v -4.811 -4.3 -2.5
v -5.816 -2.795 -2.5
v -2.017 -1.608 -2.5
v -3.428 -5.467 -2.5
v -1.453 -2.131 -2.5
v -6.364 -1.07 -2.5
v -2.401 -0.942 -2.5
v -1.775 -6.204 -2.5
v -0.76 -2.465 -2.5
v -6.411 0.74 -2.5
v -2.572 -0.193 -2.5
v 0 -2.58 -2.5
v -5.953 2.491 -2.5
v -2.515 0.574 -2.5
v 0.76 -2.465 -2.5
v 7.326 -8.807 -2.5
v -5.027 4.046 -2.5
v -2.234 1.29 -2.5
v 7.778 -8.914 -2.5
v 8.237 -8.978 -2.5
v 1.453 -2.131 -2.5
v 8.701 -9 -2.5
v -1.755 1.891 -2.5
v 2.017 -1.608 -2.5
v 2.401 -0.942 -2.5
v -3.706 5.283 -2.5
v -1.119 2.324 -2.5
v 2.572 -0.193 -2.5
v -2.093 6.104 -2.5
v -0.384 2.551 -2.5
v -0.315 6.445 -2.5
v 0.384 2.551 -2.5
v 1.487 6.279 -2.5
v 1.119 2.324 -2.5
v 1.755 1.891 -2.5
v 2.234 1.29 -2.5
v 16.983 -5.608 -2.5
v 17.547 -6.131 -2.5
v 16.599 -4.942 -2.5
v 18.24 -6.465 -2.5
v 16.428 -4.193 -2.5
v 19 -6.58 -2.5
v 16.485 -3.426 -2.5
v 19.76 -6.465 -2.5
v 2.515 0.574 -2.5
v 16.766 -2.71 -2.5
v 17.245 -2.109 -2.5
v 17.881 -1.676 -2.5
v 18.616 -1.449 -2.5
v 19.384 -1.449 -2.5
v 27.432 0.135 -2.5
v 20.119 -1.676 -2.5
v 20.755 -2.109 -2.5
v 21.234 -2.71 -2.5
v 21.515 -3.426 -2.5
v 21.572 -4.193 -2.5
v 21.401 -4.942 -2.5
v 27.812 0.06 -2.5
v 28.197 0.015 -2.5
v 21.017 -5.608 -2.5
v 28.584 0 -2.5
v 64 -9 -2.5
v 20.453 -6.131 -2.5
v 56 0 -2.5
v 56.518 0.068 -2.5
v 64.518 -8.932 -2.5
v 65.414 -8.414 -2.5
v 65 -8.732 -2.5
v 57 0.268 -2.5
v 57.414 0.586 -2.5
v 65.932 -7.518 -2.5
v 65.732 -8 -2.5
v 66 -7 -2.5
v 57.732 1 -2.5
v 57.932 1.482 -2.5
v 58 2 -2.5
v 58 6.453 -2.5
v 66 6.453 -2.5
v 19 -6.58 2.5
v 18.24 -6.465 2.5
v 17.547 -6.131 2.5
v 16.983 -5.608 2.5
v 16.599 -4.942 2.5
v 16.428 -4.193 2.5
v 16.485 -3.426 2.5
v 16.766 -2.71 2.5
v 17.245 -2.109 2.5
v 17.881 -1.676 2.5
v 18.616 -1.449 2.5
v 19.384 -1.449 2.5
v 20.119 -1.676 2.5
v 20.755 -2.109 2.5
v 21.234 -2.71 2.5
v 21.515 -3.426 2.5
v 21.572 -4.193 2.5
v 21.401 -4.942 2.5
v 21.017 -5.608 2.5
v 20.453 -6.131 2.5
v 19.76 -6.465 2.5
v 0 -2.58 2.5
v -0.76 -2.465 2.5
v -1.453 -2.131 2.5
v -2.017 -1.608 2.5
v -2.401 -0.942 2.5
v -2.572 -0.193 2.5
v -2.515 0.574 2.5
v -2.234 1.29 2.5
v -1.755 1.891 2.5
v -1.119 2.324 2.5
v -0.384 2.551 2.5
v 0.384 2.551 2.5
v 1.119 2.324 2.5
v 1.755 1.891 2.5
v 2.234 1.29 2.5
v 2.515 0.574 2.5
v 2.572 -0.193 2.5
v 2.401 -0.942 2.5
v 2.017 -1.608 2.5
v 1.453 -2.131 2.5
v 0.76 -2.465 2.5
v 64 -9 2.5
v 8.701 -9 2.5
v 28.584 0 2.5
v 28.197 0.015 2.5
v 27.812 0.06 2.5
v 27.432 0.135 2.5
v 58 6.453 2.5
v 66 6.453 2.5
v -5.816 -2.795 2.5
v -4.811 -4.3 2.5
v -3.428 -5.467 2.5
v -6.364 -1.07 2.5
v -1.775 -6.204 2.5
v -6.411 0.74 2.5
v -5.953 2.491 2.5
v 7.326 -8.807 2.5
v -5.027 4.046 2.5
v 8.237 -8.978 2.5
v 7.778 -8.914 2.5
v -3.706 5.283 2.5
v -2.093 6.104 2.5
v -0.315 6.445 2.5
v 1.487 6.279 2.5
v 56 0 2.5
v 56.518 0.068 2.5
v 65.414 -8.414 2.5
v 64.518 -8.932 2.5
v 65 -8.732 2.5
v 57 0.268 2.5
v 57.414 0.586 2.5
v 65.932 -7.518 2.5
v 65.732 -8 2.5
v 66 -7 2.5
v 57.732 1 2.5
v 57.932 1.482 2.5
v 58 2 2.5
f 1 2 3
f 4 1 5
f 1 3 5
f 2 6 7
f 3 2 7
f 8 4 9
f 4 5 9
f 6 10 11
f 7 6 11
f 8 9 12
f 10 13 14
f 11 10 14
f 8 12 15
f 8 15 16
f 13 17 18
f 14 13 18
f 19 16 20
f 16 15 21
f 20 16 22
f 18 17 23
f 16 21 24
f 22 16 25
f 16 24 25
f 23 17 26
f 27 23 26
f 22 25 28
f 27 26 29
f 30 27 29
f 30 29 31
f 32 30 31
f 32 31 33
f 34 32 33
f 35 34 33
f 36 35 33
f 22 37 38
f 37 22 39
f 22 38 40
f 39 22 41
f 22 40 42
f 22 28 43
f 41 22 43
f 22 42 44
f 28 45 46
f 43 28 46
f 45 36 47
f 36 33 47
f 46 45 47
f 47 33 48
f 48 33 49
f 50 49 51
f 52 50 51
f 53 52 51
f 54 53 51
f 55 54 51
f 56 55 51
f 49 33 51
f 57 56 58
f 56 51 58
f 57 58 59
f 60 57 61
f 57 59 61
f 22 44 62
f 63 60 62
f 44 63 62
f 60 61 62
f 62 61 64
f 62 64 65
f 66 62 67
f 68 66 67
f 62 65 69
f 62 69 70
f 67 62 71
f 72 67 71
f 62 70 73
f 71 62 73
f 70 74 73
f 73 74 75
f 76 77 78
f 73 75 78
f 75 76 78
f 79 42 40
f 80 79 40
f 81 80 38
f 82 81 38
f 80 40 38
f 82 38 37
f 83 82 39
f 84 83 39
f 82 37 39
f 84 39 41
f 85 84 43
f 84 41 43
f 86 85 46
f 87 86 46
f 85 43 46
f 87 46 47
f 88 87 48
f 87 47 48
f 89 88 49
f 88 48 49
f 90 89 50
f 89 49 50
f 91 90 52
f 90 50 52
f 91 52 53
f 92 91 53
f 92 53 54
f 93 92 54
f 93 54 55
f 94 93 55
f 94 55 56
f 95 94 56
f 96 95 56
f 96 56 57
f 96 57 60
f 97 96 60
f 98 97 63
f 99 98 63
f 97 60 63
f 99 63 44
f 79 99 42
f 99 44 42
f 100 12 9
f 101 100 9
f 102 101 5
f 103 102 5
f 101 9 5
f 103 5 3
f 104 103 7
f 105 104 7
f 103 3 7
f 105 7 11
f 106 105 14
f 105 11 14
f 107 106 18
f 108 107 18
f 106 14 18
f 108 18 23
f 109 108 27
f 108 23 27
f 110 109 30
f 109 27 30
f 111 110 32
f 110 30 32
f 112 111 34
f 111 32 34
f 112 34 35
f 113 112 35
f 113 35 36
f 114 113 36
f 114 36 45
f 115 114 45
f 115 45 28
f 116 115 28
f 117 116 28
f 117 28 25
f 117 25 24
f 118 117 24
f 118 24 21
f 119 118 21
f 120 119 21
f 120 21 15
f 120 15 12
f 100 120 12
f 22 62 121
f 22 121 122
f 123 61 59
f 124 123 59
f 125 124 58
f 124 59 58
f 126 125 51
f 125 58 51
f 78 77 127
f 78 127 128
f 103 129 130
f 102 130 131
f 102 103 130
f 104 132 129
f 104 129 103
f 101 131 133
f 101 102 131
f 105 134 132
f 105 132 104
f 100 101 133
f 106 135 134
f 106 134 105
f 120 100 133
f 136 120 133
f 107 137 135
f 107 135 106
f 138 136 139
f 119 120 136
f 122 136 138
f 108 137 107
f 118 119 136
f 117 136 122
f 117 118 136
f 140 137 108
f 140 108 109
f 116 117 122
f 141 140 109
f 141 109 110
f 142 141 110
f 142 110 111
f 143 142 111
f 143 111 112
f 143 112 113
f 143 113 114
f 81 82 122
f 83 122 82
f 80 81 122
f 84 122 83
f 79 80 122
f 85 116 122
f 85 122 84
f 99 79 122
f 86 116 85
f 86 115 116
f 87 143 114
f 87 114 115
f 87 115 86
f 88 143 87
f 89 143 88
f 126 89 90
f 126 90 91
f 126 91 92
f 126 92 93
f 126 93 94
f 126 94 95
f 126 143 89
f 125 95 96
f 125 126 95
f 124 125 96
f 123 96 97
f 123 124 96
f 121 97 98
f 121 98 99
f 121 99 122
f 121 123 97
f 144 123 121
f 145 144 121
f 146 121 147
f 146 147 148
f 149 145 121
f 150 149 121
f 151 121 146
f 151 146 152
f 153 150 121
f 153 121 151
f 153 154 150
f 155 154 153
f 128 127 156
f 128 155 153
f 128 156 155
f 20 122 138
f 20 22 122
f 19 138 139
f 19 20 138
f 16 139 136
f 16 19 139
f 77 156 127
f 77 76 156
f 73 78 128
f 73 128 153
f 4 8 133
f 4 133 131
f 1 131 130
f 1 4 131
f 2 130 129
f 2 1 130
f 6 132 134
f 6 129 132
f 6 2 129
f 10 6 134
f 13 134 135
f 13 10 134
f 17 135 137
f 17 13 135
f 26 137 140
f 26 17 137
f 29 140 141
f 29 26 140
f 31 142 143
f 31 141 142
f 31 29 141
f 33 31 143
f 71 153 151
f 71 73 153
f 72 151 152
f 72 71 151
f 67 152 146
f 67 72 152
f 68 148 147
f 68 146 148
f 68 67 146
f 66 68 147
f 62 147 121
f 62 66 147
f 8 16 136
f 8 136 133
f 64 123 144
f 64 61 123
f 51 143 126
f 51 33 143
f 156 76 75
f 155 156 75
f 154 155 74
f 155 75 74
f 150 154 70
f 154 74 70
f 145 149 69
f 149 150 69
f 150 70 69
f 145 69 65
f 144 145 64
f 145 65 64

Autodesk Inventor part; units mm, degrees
ref_plane "YZ Plane" through (0, 0, 0) normal (1, 0, 0) x (0, 1, 0)
ref_plane "XZ Plane" through (0, 0, 0) normal (0, 1, 0) x (-1, 0, 0)
ref_plane "XY Plane" through (0, 0, 0) normal (0, 0, 1) x (1, 0, 0)
sketch "Sketch1" plane through (0, 0, 0) normal (0, 0, 1) x (1, 0, 0)
  line L0 (1.4872, 6.2793) -> (27.4317, 0.1346)
  line L1 (28.584, 0) -> (56, 0)
  line L2 (58, 2) -> (58, 6.4531)
  line L3 (58, 6.4531) -> (66, 6.4531)
  line L4 (66, 6.4531) -> (66, -7)
  line L5 (64, -9) -> (8.701, -9)
  line L6 (7.326, -8.8072) -> (-1.7746, -6.2043)
  arc A0 (1.4872, 6.2793) -> (-1.7746, -6.2043) centre (0, 0) ccw
  arc A1 (27.4317, 0.1346) -> (28.584, 0) centre (28.584, 5) ccw
  arc A2 (7.326, -8.8072) -> (8.701, -9) centre (8.701, -4) ccw
  arc A3 (56, 0) -> (58, 2) centre (56, 2) ccw
  arc A4 (64, -9) -> (66, -7) centre (64, -7) ccw
  point P0 (28, 0)
  point P1 (66, -9)
  point P2 (8, -9)
  point P3 (19, -4)
  dimension "d0" = 66
  dimension "d1" = 8
  dimension "d2" = 9
  dimension "d3" = 20
  dimension "d4" = 28
  dimension "d5" = 5
  dimension "d6" = 2
  dimension "d17" = 45
  dimension "d18" = 4
extrude "Extrusion1" add sketch "Sketch1" along normal mid plane 5
hole "Hole2" at (19, -4, 0) at (0, 0, 0) direction (0, 0, -1) diameter 5.159 end through all both
properties part number "tappy"
